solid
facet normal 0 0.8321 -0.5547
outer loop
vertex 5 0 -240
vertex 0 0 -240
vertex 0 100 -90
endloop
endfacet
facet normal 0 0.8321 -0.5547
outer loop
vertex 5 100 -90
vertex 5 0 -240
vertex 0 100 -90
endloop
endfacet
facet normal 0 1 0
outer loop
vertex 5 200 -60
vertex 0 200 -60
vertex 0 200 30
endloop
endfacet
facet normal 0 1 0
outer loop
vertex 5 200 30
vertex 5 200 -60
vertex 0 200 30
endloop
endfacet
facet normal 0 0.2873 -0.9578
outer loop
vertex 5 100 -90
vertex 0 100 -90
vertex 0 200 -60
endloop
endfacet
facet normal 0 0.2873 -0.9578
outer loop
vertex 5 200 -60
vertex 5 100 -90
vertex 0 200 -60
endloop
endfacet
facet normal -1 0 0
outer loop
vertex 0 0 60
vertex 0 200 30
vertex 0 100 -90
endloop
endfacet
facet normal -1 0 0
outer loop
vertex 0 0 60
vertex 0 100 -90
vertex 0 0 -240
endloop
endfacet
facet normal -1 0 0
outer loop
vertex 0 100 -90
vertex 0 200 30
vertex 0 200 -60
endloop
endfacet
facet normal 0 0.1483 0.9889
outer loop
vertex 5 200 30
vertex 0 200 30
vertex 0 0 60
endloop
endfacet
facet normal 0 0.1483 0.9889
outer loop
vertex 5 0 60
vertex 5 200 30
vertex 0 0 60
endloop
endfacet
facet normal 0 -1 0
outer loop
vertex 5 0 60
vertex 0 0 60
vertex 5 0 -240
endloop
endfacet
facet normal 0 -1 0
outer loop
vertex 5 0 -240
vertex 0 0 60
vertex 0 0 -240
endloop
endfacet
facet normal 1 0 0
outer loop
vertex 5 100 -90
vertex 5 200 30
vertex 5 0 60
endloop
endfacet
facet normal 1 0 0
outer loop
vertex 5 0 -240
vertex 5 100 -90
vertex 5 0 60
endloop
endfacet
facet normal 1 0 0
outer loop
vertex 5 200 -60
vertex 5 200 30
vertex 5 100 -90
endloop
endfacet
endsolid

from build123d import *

# Parameters (mm, degrees)
EXTRUDE_2_DEPTH = 5


with BuildPart() as part:
    # 草图1 → 拉伸2 (new body)
    with BuildSketch(Plane(origin=(0, 0, 0), x_dir=(0, 0, -1), z_dir=(1, 0, 0))):
        Polygon((-30, 200), (-60, 0), (120, 0), (90, 100), (60, 200), align=None)
        Polygon((90, 100), (120, 0), (240, 0), align=None)
    extrude(amount=EXTRUDE_2_DEPTH)


solid = part.part
